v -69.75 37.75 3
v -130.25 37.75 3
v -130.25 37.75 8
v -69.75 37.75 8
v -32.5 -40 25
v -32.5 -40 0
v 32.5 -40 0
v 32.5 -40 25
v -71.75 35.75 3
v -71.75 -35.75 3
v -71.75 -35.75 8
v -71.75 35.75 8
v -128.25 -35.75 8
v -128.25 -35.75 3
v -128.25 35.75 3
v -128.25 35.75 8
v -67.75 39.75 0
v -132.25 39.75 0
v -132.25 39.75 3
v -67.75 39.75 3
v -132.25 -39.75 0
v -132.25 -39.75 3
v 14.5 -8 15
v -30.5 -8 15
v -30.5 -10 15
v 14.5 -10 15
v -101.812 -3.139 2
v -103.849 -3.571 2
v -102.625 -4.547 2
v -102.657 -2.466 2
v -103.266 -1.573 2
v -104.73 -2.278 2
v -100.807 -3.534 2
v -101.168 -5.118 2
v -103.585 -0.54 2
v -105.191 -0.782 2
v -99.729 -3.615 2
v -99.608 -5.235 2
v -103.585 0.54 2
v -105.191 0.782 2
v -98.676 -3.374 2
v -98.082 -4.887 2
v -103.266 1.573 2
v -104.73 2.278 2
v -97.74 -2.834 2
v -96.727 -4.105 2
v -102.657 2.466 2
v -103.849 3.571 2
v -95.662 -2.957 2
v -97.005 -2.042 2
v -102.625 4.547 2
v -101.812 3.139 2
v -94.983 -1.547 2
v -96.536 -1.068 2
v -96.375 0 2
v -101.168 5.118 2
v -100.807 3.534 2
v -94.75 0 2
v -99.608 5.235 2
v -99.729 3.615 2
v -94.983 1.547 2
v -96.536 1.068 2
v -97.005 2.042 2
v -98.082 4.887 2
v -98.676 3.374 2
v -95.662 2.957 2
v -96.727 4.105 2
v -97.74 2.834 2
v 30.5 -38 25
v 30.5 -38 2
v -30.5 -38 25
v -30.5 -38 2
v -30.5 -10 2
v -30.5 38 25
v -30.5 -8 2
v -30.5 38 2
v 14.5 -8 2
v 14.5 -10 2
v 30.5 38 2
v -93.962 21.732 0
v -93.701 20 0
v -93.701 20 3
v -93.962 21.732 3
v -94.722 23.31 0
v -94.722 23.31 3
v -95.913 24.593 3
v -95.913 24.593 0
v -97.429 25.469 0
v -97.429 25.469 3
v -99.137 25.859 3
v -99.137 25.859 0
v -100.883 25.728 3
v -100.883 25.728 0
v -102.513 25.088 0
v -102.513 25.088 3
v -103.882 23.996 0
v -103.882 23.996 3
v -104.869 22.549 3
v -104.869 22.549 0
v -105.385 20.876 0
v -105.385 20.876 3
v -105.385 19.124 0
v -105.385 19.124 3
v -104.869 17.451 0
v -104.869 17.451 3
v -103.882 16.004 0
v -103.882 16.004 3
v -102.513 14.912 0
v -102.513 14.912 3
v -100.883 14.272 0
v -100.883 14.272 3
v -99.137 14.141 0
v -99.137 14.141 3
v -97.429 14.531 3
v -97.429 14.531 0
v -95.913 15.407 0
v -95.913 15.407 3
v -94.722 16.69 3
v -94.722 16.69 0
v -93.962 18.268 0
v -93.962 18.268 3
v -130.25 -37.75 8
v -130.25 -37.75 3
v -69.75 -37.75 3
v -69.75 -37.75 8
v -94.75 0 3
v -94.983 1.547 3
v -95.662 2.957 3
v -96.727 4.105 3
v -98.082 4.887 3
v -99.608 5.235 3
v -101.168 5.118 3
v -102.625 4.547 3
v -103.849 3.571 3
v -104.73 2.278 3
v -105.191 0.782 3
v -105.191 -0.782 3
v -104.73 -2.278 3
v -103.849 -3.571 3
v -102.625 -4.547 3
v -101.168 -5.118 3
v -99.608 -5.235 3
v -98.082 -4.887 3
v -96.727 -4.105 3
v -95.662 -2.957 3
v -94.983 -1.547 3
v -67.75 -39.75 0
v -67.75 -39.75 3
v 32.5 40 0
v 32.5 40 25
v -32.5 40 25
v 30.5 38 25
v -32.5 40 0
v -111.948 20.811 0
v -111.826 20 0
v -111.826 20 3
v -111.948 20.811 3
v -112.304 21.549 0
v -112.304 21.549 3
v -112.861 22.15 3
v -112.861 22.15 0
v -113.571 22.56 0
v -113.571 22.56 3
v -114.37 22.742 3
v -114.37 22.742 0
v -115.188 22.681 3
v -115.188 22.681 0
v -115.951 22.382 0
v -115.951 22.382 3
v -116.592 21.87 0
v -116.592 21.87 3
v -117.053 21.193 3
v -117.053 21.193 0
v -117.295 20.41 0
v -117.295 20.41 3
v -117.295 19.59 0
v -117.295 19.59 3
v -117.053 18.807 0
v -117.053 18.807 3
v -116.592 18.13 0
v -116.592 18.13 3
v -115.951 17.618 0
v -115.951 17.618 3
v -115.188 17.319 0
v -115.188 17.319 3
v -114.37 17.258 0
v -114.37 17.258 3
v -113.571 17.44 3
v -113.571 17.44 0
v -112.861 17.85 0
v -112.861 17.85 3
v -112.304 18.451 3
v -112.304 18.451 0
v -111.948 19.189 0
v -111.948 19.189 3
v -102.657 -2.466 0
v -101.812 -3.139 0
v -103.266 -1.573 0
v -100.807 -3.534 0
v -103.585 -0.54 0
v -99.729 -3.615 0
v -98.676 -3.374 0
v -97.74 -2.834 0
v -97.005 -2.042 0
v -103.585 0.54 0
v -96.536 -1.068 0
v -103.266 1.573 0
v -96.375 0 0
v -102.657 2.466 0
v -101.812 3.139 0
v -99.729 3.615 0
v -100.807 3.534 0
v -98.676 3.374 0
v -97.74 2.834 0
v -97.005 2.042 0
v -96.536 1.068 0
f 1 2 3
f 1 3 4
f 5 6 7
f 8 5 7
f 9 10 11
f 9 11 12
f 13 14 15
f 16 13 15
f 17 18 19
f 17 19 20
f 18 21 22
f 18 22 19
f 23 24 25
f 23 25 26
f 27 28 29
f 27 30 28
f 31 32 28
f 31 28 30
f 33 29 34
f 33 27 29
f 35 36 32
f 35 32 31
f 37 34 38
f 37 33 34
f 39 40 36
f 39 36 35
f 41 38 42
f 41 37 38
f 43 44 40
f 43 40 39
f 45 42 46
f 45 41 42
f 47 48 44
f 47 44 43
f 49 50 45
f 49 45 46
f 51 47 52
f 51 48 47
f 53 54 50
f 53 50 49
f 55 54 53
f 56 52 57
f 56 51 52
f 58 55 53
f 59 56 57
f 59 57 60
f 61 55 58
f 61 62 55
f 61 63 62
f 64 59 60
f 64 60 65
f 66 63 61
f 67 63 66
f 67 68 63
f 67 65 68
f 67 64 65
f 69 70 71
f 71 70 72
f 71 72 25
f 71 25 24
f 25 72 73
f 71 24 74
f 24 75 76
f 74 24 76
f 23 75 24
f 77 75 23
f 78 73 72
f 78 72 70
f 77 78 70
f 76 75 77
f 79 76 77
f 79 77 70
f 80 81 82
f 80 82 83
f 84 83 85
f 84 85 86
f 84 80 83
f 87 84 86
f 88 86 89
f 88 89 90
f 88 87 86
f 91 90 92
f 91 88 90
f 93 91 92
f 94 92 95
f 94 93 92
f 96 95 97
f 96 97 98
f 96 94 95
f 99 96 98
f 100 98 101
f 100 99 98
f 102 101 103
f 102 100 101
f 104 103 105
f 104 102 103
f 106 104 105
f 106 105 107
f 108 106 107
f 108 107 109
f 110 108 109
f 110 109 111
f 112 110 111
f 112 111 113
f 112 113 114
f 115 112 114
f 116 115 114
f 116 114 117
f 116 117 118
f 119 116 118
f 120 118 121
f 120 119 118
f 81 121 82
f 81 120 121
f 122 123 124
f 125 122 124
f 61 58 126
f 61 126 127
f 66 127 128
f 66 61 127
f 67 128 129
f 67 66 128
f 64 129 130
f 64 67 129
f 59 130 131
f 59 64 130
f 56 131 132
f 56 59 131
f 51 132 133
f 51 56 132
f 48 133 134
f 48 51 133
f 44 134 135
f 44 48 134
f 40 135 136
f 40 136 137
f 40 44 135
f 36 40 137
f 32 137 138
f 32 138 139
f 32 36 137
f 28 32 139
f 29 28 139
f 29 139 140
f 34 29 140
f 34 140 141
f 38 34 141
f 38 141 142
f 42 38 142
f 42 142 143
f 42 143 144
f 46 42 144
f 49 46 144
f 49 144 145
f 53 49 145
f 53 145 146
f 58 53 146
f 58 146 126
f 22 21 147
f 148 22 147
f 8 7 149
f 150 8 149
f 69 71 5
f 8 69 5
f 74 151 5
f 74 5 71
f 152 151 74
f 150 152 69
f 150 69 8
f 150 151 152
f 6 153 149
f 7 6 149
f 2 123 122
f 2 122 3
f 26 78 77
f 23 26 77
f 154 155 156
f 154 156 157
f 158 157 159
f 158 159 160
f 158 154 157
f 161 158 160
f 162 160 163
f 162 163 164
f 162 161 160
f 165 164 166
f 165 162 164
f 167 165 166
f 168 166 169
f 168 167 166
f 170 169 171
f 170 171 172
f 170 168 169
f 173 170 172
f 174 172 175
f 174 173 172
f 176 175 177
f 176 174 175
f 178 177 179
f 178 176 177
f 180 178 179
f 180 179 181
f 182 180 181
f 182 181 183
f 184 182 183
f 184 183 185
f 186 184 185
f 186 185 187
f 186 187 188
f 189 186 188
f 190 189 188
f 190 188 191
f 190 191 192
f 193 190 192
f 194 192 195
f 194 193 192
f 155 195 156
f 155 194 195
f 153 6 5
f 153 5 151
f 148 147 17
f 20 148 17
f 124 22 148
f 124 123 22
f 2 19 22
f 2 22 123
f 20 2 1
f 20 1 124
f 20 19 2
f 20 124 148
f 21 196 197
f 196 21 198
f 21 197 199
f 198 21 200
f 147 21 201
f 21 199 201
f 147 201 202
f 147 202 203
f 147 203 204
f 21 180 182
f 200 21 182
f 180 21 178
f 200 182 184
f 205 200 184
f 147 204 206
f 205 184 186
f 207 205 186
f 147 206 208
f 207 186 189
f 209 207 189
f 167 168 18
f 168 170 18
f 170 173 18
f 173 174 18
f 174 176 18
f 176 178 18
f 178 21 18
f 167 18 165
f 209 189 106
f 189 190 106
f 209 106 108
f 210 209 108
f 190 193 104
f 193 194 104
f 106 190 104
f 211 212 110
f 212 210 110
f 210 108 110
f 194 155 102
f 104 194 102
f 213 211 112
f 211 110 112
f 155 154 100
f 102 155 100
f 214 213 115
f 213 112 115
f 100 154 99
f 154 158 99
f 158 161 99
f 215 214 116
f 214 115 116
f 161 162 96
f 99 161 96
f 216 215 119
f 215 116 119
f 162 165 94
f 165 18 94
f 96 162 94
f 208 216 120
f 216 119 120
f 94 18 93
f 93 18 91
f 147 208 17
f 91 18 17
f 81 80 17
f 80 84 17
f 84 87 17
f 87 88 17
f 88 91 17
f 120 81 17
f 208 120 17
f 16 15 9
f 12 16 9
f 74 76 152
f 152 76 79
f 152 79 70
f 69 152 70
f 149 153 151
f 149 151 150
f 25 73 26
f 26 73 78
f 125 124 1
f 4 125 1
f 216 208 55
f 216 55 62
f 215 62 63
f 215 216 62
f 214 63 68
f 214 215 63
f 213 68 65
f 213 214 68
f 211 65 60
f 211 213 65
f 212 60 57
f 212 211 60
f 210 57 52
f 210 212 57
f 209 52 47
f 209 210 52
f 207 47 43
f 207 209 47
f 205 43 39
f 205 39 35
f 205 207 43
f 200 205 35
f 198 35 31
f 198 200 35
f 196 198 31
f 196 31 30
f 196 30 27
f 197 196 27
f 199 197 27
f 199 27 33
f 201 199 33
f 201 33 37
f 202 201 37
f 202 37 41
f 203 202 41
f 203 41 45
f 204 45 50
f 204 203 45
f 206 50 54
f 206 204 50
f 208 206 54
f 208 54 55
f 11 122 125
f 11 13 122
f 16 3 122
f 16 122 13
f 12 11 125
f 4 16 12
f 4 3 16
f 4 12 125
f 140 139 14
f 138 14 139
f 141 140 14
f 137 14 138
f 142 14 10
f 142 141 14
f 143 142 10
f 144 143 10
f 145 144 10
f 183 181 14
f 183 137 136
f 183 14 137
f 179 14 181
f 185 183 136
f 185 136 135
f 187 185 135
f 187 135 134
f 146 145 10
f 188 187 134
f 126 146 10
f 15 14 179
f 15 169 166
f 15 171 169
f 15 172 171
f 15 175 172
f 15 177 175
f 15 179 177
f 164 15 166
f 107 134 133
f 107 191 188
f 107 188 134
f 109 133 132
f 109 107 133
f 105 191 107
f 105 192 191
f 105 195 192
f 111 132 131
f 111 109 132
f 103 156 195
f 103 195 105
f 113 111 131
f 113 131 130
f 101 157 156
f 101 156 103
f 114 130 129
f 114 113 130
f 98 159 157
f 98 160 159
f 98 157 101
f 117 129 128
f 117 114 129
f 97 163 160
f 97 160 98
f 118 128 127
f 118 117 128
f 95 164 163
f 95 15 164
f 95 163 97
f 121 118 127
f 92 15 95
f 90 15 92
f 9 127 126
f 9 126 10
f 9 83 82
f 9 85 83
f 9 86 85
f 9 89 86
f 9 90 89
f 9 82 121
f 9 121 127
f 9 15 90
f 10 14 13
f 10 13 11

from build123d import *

# Parameters (mm, degrees)
F1_DEPTH = 2
F0_W     = 65
F0_H     = 80
F2_DEPTH = 25
F0_W_2   = 45
F0_H_2   = 2
F3_DEPTH = 15
F0_W_3   = 64.5
F0_H_3   = 79.5
F0_W_4   = 60.5
F0_H_4   = 75.5
F0_W_5   = 56.5
F0_H_5   = 71.5
F0_R     = 5.25
F0_R_2   = 2.75
F0_R_3   = 5.875
F4_DEPTH = 3
F5_DEPTH = 8
F0_R_4   = 3.625
F6_DEPTH = 2


with BuildPart() as f1:
    # F0 (on Top) → F1 (new body)
    with BuildSketch(Plane.XY):
        Polygon((30.5, -38), (30.5, 38), (-30.5, 38), (-30.5, -8), (14.5, -8), (14.5, -10), (-30.5, -10), (-30.5, -38), align=None)
    extrude(amount=F1_DEPTH)

    # F0 (on Top) → F2 (join)
    with BuildSketch(Plane.XY):
        Rectangle(F0_W, F0_H)
        Polygon((-30.5, 38), (30.5, 38), (30.5, -38), (-30.5, -38), (-30.5, -10), (-30.5, -8), align=None, mode=Mode.SUBTRACT)
    extrude(amount=F2_DEPTH)

    # F0 (on Top) → F3 (join)
    with BuildSketch(Plane.XY):
        with Locations((-8, -9)):
            Rectangle(F0_W_2, F0_H_2)
    extrude(amount=F3_DEPTH)


with BuildPart() as f4:
    # F0 (on Top) → F4 (new body)
    with BuildSketch(Plane.XY):
        with Locations((-100, 0)):
            Rectangle(F0_W_3, F0_H_3)
        with Locations((-100, 0)):
            Rectangle(F0_W_4, F0_H_4, mode=Mode.SUBTRACT)
        with Locations((-100, 0)):
            Rectangle(F0_W_5, F0_H_5)
        with Locations((-100, 0)):
            Circle(F0_R, mode=Mode.SUBTRACT)
        with Locations((-114.575721, 20)):
            Circle(F0_R_2, mode=Mode.SUBTRACT)
        with Locations((-99.575721, 20)):
            Circle(F0_R_3, mode=Mode.SUBTRACT)
    extrude(amount=F4_DEPTH)

    # F0 (on Top) → F5 (join)
    with BuildSketch(Plane.XY):
        with Locations((-100, 0)):
            Rectangle(F0_W_4, F0_H_4)
        with Locations((-100, 0)):
            Rectangle(F0_W_5, F0_H_5, mode=Mode.SUBTRACT)
    extrude(amount=F5_DEPTH)

    # F0 (on Top) → F6 (join)
    with BuildSketch(Plane.XY):
        with Locations((-100, 0)):
            Circle(F0_R)
        with Locations((-100, 0)):
            Circle(F0_R_4, mode=Mode.SUBTRACT)
    extrude(amount=F6_DEPTH)


solid = Compound([f1.part, f4.part])
